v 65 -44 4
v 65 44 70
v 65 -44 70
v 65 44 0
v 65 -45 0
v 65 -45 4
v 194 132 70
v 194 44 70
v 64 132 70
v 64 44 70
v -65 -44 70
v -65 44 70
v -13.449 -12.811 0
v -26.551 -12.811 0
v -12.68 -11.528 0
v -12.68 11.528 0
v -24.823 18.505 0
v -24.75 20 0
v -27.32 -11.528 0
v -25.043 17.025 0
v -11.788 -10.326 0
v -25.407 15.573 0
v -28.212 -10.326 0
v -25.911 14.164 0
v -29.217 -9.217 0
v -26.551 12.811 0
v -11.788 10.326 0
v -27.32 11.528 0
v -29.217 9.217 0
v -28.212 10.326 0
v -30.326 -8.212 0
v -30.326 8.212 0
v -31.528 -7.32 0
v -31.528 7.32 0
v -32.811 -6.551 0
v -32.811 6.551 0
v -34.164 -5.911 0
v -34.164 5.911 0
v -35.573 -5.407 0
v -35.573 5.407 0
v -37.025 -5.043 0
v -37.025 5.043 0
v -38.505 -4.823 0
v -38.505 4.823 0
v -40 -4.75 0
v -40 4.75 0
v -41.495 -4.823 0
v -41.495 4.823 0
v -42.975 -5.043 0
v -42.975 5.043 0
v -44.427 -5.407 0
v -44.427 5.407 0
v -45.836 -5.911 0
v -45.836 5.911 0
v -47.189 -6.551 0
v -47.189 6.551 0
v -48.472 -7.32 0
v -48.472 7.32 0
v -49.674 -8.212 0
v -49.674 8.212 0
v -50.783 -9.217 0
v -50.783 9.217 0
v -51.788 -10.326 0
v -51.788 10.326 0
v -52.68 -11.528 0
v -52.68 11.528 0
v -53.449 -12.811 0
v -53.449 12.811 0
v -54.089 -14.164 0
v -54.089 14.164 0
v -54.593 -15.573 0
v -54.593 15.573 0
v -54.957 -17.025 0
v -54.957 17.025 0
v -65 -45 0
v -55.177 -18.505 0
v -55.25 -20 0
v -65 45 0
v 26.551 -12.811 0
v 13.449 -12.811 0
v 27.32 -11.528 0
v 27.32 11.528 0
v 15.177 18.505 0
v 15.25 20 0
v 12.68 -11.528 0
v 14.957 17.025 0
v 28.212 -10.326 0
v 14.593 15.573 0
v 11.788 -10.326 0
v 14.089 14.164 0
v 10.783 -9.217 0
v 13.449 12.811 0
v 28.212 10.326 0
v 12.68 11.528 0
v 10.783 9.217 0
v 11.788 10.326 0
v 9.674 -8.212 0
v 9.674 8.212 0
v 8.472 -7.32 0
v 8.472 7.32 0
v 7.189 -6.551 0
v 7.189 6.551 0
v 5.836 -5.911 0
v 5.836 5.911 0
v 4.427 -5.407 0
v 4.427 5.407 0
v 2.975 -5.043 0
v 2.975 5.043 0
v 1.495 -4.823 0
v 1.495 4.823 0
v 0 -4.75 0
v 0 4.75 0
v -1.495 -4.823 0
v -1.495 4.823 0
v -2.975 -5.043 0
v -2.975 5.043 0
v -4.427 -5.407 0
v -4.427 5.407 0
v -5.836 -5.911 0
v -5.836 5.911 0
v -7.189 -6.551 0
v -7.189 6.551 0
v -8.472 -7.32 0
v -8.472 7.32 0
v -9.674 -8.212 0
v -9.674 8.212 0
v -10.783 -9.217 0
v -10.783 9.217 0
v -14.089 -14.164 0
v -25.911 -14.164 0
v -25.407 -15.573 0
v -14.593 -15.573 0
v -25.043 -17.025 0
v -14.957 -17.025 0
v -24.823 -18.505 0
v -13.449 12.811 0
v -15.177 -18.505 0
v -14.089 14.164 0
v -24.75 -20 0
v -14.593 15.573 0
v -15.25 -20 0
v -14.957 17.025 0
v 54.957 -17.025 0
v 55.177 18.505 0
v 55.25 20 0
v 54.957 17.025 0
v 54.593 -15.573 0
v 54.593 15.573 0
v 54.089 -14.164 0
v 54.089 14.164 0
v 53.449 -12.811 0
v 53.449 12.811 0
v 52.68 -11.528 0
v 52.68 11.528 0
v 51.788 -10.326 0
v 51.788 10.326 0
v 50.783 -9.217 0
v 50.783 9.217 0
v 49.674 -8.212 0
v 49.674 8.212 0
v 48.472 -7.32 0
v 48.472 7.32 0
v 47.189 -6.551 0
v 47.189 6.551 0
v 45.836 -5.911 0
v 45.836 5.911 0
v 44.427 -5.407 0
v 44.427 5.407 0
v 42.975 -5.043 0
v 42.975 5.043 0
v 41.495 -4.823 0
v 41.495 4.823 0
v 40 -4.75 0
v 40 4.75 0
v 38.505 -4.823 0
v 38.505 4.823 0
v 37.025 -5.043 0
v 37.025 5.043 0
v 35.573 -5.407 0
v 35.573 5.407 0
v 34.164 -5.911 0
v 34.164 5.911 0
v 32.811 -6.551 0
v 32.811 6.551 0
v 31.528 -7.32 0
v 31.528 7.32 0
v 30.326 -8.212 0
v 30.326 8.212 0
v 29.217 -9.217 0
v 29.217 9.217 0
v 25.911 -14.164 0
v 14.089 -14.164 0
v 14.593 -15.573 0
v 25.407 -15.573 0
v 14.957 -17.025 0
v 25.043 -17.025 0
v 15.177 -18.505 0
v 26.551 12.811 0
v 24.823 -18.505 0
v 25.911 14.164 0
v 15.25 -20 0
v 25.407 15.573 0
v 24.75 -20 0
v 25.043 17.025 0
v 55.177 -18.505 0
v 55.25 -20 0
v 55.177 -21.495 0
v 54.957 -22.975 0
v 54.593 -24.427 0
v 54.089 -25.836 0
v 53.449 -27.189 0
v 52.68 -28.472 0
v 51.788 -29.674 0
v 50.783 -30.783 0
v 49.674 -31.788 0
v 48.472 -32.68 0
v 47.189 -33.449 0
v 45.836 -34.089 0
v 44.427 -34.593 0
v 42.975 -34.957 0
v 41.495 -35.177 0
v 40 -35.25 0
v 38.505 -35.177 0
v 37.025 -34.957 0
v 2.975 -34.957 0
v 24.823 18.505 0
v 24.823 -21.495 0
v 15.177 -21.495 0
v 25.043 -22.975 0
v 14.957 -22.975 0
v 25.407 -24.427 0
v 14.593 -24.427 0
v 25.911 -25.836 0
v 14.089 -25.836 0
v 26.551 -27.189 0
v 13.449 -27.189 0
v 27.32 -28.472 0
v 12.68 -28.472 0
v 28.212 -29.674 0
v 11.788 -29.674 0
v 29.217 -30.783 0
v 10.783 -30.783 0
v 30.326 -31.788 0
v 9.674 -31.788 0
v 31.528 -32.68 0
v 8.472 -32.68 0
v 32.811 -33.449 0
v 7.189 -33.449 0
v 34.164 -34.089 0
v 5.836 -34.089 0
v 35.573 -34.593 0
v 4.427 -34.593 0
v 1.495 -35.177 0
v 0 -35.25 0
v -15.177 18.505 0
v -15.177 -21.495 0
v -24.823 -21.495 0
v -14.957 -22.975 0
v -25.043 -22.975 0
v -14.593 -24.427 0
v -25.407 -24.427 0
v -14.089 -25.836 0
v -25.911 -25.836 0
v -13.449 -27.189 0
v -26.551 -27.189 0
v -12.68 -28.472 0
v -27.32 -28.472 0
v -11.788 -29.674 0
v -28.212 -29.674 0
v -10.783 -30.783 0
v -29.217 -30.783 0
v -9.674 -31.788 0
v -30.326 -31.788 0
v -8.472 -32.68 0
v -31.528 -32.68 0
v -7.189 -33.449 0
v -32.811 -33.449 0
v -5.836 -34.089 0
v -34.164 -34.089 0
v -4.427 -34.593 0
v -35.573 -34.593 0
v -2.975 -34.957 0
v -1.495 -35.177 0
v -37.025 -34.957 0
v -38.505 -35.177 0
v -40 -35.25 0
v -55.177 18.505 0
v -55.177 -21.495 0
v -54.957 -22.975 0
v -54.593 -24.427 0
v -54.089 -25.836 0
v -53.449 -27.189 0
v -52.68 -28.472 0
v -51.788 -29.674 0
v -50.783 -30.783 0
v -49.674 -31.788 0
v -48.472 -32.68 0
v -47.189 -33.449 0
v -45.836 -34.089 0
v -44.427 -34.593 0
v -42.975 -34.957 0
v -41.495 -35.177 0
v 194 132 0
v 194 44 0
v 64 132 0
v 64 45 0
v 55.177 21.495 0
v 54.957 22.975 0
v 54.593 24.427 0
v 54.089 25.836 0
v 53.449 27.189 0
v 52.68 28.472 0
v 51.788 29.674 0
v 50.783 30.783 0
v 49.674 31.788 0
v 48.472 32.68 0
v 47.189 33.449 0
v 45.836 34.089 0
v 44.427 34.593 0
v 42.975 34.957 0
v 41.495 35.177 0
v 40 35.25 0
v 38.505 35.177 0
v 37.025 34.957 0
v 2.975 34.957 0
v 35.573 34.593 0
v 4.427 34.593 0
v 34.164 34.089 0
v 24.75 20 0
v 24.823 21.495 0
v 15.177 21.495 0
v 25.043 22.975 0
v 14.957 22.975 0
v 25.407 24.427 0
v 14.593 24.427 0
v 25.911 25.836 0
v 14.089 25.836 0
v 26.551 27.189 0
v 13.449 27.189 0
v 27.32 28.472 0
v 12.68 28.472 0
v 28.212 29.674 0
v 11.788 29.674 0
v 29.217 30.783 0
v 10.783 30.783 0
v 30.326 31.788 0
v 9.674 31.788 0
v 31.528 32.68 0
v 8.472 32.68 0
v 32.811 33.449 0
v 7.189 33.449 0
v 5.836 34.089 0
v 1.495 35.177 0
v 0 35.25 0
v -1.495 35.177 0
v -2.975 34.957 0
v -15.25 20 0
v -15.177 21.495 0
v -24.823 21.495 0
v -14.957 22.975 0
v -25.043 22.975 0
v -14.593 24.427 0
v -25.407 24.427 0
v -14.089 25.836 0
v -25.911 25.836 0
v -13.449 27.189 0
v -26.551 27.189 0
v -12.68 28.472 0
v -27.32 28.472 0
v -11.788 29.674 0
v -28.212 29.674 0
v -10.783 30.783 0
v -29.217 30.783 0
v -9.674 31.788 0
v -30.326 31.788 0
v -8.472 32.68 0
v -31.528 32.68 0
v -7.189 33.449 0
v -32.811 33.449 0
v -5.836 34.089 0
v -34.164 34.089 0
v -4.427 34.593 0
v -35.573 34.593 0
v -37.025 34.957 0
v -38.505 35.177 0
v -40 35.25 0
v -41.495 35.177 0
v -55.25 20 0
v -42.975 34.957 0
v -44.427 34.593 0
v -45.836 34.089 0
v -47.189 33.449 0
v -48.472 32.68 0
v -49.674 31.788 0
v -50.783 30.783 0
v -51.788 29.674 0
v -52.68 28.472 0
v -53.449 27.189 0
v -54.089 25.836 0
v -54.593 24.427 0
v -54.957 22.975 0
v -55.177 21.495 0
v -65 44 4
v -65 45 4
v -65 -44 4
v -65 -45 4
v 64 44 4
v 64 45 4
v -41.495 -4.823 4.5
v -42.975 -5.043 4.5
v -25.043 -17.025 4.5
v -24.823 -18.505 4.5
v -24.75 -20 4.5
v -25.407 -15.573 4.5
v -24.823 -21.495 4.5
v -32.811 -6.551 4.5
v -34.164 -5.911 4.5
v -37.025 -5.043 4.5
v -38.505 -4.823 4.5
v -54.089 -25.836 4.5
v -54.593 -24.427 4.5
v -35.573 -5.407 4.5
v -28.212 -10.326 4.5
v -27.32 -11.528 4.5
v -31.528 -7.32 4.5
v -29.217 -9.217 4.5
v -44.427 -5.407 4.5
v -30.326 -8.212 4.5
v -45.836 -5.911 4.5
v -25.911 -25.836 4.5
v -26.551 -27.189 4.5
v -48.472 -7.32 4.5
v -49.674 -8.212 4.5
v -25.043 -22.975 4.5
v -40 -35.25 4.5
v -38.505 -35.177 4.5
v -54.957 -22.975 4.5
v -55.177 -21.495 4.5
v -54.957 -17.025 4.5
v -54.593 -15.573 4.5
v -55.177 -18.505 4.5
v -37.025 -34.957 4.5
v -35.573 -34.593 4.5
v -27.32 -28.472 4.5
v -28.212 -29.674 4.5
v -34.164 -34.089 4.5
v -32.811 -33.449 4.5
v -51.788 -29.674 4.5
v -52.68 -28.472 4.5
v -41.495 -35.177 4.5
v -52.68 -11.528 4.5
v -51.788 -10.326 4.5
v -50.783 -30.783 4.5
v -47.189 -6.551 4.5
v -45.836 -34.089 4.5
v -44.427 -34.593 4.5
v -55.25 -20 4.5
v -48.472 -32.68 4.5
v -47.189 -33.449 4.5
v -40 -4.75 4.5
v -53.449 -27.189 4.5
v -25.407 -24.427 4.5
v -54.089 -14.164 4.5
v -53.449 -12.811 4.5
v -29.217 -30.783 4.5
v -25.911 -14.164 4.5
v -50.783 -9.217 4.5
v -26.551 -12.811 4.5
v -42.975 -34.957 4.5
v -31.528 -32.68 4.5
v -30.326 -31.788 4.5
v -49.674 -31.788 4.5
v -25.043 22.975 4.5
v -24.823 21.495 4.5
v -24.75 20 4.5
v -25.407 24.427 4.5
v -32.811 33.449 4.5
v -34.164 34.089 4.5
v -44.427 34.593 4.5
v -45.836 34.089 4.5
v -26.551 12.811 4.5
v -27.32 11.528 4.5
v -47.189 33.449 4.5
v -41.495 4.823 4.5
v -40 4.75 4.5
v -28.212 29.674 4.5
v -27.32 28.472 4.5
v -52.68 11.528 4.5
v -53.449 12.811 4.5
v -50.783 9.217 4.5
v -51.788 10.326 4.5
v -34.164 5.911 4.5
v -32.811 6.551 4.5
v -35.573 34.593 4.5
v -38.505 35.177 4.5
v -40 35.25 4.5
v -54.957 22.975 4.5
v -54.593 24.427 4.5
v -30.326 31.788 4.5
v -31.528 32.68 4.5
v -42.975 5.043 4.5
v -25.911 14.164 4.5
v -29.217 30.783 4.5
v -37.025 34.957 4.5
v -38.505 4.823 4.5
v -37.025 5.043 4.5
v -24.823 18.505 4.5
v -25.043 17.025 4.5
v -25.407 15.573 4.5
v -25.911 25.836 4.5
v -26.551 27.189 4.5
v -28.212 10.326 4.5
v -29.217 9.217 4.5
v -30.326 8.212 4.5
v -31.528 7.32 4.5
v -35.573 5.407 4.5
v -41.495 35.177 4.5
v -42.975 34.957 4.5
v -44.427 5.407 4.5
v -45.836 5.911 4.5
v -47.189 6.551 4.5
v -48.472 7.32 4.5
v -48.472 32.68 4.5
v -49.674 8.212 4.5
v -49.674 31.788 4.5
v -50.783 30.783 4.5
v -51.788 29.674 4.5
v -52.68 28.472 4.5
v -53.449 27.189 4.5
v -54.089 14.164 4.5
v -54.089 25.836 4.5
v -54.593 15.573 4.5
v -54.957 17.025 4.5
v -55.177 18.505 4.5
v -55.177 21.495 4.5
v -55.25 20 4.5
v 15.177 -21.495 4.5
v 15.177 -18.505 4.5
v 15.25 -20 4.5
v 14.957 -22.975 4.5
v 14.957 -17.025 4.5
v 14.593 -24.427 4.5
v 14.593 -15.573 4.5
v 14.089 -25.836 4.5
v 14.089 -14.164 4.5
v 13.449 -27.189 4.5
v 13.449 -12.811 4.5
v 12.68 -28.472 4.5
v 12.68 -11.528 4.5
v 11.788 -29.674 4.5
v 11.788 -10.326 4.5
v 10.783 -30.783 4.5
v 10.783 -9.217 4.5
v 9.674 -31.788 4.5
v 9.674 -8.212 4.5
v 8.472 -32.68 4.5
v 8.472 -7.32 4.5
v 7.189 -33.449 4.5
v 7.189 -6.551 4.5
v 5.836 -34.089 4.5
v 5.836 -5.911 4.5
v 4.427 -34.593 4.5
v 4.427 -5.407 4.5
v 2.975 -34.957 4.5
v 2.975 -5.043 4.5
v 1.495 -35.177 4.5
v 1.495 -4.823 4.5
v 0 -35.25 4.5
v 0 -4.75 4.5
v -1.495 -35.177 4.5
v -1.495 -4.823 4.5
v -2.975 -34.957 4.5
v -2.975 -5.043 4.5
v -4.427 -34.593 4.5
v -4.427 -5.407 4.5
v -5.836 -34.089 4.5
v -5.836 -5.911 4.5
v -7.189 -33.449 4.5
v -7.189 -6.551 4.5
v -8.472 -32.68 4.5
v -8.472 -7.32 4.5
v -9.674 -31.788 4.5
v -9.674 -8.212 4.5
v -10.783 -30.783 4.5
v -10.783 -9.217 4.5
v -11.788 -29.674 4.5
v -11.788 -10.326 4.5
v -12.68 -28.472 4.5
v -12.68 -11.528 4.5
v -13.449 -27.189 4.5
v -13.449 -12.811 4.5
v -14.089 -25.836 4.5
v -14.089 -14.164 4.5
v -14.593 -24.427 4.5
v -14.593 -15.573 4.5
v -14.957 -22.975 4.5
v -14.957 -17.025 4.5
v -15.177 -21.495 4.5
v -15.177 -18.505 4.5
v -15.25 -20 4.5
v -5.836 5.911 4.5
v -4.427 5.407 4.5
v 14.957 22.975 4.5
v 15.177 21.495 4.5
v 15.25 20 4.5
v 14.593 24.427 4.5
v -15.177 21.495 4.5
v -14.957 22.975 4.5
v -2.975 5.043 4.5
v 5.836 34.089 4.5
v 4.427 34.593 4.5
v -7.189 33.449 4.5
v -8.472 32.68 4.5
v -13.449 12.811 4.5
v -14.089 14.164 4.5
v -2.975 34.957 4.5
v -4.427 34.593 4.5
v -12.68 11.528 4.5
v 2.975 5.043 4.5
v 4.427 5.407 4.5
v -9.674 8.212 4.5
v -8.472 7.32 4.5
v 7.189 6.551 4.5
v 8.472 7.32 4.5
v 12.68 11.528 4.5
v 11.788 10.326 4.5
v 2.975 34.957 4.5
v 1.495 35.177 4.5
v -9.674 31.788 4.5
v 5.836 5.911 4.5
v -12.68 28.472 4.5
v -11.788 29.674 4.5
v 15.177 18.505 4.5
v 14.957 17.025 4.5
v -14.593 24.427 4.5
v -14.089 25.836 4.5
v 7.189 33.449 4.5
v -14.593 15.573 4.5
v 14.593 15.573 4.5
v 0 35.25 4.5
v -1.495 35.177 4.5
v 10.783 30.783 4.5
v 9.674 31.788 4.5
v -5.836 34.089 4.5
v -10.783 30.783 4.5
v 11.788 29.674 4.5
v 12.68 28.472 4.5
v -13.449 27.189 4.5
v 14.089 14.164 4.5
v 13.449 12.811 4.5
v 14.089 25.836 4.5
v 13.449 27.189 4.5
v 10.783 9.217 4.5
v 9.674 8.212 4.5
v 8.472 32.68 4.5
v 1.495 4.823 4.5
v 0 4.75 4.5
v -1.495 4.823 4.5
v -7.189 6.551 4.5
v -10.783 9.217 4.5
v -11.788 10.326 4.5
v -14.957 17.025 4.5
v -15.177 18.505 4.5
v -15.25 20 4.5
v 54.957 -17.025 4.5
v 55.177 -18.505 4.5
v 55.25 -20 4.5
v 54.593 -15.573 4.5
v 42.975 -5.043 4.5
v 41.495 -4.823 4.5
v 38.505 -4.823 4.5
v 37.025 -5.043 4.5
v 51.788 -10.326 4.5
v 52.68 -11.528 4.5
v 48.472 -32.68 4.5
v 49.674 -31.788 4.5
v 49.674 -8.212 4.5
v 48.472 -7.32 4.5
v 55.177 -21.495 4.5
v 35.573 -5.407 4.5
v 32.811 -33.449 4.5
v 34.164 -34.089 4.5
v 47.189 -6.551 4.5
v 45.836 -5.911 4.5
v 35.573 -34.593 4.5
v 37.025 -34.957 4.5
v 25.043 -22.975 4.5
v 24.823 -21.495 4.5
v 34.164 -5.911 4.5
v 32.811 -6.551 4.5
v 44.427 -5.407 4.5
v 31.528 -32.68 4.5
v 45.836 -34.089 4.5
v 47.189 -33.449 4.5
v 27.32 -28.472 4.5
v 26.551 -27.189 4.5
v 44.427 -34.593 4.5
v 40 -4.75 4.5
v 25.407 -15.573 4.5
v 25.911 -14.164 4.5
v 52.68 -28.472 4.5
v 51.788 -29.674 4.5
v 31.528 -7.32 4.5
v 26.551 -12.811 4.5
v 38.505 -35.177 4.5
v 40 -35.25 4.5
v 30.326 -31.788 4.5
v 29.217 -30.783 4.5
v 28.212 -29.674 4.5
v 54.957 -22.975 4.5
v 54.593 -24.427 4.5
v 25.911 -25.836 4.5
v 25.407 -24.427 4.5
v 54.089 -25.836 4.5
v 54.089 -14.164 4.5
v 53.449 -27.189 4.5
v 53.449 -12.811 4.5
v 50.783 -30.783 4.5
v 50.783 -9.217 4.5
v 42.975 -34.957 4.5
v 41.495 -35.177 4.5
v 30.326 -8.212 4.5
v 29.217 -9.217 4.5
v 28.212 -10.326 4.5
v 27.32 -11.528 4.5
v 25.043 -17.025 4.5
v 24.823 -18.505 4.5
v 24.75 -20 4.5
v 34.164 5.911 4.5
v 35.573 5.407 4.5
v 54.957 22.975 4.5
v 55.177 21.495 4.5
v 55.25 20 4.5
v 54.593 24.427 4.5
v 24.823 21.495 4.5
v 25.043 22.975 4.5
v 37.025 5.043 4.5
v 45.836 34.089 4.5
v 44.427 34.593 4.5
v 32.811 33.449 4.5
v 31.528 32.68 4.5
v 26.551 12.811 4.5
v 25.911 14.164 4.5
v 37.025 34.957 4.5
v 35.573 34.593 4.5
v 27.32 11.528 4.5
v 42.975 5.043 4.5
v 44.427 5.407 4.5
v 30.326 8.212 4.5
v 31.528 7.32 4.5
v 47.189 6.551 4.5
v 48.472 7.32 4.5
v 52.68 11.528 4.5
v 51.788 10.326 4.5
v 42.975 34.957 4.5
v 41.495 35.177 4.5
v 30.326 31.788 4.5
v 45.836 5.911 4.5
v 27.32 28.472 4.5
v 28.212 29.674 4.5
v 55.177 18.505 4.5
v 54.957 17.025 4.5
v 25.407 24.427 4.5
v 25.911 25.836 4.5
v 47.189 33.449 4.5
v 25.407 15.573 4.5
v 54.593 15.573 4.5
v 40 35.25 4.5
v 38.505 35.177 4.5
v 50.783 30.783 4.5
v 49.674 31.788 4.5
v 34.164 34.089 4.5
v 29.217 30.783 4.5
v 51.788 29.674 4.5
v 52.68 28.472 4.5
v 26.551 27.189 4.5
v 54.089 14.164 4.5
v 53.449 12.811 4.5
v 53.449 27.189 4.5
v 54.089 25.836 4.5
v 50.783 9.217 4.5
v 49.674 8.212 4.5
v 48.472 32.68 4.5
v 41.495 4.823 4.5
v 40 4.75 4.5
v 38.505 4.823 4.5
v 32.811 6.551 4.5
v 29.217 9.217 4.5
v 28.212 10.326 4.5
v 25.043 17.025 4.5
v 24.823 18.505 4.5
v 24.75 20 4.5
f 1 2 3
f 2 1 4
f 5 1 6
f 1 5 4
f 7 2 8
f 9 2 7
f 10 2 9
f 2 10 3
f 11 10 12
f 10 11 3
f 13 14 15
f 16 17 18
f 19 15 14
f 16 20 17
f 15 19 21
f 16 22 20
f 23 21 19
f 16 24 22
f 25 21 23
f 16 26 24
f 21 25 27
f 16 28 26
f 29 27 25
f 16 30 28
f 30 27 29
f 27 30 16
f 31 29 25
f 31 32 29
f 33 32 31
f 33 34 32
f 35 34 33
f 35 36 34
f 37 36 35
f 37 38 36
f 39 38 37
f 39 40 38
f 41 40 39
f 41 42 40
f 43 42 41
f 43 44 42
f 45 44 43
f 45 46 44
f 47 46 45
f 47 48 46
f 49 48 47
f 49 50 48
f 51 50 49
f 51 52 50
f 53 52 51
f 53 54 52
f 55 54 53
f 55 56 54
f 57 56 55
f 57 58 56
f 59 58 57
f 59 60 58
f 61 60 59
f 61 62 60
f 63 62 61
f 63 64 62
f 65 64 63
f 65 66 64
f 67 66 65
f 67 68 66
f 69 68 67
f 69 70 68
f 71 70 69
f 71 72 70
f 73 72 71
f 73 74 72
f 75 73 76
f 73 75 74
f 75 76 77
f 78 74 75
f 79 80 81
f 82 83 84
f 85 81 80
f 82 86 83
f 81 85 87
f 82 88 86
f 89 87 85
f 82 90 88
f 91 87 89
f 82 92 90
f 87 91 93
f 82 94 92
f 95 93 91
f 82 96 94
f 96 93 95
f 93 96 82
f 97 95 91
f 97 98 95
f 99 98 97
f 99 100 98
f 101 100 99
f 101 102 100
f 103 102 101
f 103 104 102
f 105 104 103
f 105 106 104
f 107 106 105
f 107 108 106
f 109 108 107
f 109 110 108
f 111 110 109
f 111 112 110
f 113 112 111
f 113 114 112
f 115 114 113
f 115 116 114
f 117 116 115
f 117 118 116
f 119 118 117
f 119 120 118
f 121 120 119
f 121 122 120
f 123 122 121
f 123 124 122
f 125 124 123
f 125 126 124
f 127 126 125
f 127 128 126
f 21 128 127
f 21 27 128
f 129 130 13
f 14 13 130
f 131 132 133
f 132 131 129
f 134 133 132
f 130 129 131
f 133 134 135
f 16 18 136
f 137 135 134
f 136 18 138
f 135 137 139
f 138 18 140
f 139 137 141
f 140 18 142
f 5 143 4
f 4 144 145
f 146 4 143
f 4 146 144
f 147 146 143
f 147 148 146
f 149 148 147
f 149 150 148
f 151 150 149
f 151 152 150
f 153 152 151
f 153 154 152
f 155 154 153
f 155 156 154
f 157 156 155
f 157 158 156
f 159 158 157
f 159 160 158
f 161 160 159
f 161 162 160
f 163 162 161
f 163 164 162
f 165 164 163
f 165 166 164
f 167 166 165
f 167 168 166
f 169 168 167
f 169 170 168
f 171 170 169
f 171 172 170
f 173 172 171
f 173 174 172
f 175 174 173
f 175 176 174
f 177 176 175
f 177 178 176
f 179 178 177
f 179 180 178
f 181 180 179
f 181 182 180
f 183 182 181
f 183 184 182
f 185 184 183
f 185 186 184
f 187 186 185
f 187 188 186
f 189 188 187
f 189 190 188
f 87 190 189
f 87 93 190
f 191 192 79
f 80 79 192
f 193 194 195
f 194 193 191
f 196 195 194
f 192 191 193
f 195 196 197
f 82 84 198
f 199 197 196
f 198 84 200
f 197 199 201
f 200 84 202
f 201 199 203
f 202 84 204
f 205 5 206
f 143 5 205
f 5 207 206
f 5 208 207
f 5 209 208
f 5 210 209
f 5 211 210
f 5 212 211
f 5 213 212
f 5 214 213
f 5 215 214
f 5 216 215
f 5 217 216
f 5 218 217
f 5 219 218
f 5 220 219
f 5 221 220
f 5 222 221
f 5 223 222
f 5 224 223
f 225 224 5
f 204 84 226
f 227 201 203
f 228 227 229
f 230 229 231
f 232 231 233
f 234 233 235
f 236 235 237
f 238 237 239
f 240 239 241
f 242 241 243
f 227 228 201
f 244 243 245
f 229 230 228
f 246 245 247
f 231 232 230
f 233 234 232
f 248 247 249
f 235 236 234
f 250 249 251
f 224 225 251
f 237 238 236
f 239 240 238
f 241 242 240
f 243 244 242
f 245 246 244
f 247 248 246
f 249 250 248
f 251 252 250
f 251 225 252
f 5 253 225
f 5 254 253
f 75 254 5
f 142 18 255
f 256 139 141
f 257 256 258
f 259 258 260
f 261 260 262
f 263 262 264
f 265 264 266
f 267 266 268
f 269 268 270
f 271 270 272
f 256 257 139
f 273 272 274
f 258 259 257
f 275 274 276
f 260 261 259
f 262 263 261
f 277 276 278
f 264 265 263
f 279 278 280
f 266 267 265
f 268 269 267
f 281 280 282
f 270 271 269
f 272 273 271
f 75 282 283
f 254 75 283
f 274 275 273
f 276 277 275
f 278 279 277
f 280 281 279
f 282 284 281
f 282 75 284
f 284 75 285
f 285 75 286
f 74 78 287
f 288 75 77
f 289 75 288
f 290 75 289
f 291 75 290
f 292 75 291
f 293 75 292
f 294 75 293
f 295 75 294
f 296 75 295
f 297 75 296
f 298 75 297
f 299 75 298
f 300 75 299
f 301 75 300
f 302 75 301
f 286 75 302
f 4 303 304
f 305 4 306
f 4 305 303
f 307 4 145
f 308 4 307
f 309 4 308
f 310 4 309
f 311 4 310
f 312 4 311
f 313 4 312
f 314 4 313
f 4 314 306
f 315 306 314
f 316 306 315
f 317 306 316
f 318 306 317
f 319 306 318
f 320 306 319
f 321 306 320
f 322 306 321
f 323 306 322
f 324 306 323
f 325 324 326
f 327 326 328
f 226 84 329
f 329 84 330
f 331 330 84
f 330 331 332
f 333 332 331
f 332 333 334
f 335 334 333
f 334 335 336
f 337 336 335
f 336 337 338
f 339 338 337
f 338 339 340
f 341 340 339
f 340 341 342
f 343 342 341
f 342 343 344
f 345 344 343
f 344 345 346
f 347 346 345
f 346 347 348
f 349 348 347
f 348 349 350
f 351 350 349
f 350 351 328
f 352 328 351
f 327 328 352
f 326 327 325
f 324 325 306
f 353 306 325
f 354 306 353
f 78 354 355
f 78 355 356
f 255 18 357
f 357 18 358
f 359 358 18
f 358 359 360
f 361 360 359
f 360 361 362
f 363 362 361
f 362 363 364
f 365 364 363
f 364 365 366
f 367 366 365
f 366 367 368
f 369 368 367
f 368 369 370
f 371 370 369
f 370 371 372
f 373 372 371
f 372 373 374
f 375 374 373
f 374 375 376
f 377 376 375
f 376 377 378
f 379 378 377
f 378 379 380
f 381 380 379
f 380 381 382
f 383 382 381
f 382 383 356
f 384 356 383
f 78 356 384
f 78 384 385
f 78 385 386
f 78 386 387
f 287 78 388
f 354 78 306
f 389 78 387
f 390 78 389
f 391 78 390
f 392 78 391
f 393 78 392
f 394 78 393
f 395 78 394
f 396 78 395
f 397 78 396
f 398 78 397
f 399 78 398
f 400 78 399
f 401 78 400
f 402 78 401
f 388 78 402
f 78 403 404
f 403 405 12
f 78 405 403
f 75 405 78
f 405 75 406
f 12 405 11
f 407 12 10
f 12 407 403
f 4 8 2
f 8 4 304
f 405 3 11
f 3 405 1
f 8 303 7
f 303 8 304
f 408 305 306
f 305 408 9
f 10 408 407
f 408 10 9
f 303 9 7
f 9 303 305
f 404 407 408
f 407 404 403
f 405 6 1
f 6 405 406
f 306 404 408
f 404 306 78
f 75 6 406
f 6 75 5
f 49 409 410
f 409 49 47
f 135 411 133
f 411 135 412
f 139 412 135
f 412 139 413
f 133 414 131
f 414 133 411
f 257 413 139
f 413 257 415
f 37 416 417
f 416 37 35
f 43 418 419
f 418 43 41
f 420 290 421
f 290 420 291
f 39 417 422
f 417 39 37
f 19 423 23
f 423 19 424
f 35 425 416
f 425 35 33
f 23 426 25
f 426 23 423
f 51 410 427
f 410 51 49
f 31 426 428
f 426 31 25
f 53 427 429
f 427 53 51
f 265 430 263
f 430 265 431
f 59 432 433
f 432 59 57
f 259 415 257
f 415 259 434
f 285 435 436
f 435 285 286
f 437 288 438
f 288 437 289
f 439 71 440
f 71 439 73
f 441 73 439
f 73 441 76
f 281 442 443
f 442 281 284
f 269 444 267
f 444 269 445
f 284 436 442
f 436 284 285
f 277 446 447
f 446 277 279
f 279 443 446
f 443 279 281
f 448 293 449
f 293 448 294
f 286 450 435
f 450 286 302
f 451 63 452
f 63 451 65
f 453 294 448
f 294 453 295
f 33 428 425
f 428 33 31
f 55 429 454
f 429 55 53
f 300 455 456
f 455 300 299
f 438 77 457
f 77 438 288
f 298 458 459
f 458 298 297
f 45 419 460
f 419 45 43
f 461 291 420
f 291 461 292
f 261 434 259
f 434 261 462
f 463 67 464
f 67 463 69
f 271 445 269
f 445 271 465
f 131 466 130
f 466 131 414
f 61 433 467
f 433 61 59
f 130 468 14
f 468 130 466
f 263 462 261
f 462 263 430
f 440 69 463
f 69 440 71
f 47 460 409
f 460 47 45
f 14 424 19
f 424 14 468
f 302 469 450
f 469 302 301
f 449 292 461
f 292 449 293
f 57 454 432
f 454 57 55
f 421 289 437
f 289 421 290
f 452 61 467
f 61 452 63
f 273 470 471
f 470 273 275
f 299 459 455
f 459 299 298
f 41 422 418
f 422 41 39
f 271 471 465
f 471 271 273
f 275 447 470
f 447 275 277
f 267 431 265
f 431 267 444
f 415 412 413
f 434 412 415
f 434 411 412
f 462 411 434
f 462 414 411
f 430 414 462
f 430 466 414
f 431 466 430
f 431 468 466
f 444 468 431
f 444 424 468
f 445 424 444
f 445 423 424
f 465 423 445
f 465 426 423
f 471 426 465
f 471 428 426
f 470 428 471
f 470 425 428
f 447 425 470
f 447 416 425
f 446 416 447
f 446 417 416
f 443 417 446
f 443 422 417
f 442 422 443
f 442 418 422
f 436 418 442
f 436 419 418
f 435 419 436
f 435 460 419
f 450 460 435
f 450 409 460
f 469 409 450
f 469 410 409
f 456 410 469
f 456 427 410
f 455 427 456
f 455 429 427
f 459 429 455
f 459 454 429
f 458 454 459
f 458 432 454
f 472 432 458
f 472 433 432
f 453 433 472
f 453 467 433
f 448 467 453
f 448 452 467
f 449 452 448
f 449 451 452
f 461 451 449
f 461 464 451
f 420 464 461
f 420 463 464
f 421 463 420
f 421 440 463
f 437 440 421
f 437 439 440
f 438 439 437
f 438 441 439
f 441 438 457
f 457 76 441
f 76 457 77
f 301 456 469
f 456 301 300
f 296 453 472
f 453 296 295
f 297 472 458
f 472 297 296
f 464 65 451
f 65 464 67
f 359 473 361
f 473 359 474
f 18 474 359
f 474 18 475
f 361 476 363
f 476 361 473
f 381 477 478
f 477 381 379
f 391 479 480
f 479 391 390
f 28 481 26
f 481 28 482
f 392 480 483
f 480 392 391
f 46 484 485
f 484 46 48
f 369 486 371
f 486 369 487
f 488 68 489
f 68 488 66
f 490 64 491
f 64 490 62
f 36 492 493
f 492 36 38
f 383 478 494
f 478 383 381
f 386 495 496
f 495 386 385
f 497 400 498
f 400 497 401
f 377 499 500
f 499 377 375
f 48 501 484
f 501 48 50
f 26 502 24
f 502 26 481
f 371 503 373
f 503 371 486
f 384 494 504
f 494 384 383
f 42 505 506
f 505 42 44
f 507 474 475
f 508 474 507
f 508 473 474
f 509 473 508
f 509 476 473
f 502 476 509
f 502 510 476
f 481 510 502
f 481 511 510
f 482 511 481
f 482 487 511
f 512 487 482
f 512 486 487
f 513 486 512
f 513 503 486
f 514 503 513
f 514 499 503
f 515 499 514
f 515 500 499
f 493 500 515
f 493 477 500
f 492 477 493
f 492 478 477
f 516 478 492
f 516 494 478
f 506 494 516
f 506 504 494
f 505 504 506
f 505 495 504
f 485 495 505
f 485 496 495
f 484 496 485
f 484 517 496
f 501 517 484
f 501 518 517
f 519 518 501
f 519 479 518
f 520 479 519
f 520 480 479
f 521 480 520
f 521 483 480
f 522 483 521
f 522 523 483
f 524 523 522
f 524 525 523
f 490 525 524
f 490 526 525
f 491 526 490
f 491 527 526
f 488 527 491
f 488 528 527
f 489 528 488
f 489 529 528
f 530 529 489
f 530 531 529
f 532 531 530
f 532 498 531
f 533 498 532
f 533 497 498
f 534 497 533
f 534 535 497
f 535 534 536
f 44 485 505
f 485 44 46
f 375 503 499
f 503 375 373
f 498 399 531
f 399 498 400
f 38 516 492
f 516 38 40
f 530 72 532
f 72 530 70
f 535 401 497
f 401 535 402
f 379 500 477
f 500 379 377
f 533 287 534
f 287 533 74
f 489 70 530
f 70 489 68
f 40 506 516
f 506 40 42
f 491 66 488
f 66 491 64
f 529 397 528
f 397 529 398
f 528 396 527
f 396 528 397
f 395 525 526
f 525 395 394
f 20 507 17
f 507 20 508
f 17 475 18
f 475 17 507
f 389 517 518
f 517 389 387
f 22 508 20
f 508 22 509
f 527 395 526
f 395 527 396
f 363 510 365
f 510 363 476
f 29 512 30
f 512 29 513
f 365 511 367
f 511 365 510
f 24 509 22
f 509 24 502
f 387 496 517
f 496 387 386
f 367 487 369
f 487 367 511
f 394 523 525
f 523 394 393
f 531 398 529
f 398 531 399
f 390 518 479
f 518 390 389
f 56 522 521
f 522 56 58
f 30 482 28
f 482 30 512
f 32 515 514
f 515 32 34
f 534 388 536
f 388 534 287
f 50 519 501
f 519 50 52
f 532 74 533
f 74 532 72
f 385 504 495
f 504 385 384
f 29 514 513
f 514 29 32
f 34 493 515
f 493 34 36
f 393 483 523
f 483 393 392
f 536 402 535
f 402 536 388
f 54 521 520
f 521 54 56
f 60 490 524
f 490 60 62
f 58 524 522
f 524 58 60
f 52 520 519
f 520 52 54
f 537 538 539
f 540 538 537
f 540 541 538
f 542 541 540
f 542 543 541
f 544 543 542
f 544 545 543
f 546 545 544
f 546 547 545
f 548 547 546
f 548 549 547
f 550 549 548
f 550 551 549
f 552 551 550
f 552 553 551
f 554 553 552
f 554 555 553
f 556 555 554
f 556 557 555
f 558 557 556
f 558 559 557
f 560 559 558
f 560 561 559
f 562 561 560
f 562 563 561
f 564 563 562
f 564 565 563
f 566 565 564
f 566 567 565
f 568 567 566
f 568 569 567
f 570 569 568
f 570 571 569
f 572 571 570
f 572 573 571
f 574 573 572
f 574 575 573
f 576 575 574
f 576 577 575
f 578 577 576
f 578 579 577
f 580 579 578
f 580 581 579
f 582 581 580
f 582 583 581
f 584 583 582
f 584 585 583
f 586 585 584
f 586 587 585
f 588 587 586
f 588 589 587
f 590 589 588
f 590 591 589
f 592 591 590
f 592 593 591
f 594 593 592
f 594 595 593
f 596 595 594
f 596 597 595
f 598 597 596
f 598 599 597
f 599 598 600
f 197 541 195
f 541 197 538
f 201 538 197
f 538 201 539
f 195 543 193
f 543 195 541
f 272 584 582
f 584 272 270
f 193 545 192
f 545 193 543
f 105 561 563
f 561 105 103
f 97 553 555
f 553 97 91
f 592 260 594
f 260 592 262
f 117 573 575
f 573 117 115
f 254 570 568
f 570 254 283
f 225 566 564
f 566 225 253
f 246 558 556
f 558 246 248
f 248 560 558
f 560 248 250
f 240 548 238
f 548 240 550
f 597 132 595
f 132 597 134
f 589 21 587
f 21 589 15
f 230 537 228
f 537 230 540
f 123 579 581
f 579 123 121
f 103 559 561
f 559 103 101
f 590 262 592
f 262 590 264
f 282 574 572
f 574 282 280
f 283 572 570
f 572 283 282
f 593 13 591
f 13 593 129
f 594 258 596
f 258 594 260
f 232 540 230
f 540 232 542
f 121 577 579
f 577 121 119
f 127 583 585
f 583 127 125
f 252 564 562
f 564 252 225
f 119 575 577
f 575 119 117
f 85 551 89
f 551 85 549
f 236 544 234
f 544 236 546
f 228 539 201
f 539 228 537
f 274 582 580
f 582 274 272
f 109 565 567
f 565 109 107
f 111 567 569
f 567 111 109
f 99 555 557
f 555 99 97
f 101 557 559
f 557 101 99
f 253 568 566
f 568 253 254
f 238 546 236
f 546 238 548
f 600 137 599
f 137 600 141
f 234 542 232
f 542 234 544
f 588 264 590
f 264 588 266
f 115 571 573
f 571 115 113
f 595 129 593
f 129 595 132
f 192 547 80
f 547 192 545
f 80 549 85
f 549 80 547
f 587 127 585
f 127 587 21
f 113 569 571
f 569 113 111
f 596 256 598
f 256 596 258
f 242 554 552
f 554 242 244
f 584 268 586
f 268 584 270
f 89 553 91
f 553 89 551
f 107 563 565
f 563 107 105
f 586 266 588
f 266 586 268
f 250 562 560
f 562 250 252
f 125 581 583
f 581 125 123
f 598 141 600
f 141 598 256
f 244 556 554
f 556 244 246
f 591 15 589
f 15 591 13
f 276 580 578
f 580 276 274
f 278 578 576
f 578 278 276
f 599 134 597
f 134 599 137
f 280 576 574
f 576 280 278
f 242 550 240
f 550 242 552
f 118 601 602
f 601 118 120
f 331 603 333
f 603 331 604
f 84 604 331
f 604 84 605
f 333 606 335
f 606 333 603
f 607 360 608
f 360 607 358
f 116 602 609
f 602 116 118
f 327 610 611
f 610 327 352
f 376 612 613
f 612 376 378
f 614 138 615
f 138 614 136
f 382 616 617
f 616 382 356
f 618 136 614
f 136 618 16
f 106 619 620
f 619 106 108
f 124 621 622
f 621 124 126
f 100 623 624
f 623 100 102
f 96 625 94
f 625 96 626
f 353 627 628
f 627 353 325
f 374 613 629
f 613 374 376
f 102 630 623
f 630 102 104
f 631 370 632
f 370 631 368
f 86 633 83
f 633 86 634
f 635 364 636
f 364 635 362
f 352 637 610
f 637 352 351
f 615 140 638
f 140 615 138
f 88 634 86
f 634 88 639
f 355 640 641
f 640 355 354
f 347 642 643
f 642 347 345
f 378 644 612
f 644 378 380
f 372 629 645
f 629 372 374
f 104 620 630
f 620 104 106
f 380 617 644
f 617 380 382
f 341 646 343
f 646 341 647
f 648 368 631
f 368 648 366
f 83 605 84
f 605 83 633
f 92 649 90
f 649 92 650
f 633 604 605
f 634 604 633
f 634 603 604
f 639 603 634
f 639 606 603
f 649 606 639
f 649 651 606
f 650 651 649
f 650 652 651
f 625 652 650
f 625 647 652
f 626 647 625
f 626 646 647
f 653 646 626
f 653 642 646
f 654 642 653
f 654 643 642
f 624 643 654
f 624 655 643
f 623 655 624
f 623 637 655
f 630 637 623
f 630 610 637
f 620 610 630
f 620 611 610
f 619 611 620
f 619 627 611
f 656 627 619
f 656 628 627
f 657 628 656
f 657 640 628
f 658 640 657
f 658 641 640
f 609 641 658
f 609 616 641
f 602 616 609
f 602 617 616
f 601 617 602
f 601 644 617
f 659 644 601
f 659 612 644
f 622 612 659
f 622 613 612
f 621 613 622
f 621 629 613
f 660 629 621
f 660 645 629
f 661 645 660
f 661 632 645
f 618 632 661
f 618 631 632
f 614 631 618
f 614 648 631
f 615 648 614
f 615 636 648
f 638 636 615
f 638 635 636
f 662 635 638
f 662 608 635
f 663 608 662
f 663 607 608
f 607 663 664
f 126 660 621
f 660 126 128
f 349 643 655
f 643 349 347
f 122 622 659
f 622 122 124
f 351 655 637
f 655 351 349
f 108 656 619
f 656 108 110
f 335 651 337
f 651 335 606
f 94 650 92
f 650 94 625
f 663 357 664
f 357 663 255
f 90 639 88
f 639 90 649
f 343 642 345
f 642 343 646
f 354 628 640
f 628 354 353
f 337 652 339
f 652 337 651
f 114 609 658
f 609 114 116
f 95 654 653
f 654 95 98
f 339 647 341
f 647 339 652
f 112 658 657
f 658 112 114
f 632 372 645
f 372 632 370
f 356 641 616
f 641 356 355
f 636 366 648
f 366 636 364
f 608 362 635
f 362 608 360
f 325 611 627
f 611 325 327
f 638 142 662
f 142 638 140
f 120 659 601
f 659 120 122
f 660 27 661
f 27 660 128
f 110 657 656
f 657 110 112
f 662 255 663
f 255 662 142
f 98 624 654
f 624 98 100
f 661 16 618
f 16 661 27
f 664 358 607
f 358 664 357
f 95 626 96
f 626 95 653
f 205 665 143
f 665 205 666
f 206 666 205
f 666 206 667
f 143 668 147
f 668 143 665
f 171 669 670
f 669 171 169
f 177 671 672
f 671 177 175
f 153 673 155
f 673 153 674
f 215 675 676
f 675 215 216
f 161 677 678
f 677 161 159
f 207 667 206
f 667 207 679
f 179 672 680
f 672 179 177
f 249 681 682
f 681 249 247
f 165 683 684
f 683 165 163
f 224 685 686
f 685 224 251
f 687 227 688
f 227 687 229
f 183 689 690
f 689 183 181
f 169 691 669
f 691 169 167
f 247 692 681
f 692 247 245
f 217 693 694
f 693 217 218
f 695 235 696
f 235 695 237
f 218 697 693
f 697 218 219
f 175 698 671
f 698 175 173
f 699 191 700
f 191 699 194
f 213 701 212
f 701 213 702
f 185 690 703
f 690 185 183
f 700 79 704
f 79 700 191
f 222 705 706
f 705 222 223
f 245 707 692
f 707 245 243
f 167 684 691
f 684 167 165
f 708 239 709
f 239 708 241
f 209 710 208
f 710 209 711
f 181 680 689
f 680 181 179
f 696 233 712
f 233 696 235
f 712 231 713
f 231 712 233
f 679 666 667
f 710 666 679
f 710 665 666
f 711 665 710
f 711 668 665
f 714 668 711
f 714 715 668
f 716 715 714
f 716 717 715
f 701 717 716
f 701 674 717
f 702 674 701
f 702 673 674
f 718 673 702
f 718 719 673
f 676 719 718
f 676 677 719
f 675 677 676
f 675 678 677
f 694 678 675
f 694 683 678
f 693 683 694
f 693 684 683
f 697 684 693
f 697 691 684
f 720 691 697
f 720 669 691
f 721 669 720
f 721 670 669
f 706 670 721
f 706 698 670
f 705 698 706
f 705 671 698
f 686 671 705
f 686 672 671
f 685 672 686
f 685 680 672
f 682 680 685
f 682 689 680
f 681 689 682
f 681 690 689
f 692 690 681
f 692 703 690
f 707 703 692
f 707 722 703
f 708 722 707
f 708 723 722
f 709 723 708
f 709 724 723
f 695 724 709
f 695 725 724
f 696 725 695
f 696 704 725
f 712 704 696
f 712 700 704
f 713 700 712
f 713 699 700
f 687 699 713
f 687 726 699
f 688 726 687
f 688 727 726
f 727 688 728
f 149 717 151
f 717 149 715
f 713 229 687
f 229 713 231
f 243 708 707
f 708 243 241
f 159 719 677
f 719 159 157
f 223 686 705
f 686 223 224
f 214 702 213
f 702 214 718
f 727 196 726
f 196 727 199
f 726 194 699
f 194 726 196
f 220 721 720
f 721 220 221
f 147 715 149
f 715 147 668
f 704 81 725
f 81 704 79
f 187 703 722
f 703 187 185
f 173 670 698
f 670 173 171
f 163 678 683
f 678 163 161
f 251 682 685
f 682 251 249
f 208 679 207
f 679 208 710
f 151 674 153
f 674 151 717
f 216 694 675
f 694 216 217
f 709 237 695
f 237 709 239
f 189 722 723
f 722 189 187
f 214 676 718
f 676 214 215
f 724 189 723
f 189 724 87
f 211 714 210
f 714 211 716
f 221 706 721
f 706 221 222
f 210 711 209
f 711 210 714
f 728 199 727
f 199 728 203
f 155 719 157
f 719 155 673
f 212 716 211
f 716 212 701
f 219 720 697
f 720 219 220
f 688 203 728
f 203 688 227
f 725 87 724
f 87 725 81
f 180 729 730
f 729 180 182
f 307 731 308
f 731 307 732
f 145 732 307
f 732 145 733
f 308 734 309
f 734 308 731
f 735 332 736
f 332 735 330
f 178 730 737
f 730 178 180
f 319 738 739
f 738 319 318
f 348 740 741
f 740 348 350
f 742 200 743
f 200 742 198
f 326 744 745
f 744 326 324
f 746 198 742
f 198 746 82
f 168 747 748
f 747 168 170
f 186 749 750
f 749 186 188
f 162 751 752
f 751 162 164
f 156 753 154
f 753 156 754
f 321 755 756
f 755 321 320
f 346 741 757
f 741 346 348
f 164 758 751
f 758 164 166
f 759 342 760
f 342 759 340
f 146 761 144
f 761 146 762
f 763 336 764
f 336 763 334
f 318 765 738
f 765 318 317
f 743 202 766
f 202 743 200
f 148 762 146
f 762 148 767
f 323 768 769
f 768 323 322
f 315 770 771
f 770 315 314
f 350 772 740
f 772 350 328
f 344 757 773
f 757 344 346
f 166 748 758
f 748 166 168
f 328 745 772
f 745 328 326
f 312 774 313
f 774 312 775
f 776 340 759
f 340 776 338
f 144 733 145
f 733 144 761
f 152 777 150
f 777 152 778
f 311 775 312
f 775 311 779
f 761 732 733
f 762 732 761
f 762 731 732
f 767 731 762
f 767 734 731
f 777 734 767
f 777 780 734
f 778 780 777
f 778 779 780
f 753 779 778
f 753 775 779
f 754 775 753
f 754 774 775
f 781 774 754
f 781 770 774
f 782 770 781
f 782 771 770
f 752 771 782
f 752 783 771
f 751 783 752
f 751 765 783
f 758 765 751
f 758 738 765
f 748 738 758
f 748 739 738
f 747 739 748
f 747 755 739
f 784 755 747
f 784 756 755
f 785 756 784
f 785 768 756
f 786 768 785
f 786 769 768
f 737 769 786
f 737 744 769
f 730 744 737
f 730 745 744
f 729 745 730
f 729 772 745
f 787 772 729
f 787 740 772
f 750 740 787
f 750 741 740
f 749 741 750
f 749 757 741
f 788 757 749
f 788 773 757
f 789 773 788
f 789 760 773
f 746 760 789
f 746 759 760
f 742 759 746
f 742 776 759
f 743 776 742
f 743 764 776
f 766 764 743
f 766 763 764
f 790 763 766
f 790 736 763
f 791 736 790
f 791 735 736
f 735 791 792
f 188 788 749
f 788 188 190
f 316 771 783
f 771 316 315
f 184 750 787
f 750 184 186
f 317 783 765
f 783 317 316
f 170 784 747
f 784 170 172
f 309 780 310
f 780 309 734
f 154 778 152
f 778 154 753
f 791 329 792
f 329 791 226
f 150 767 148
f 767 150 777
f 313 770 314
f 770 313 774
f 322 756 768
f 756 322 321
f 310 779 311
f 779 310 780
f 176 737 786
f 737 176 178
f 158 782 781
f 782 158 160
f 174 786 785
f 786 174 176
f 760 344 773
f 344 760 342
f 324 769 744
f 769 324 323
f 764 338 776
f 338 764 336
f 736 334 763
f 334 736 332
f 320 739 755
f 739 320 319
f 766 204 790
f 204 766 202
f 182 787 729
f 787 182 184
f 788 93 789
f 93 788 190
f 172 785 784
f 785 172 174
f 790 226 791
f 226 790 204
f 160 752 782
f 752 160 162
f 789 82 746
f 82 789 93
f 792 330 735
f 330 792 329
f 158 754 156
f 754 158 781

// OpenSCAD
// Rack for six 50 mL conical (Falcon-type) tubes
// Print orientation: flat plate on bed, holes vertical.
// After printing: flip the part so the two wall strips stand on the bed.

$fn = 64;

// ---- Plate ----
plate_x     = 130;   // plate length (X)
plate_y     = 90;    // plate width (Y)
plate_t     = 4;     // plate thickness (Z)

// ---- Holes ----
hole_d      = 30.5;  // hole diameter
hole_nx     = 3;     // holes along X
hole_ny     = 2;     // holes along Y
hole_pitch  = 40;    // centre-to-centre spacing (both directions)

// ---- Walls ----
wall_h      = 66;    // wall height above plate (Z)

// ---- Misc ----
eps         = 0.5;   // cutter overshoot past faces

difference() {
    union() {
        // Base plate
        translate([-plate_x/2, -plate_y/2, 0])
            cube([plate_x, plate_y, plate_t]);

        // Two solid walls along the long edges
        for (s = [-1, 1])
            translate([s > 0 ? plate_x/2 - 1 : -plate_x/2,
                       s * (plate_y/2 - 1), 0])
                cube([plate_x, plate_y - 2, plate_t + wall_h]);
    }

    // Through-holes in the plate
    for (i = [0 : hole_nx - 1])
        for (j = [0 : hole_ny - 1])
            translate([(i - (hole_nx - 1)/2) * hole_pitch,
                       (j - (hole_ny - 1)/2) * hole_pitch,
                       -eps])
                cylinder(d = hole_d, h = plate_t + 2 * eps);
}
